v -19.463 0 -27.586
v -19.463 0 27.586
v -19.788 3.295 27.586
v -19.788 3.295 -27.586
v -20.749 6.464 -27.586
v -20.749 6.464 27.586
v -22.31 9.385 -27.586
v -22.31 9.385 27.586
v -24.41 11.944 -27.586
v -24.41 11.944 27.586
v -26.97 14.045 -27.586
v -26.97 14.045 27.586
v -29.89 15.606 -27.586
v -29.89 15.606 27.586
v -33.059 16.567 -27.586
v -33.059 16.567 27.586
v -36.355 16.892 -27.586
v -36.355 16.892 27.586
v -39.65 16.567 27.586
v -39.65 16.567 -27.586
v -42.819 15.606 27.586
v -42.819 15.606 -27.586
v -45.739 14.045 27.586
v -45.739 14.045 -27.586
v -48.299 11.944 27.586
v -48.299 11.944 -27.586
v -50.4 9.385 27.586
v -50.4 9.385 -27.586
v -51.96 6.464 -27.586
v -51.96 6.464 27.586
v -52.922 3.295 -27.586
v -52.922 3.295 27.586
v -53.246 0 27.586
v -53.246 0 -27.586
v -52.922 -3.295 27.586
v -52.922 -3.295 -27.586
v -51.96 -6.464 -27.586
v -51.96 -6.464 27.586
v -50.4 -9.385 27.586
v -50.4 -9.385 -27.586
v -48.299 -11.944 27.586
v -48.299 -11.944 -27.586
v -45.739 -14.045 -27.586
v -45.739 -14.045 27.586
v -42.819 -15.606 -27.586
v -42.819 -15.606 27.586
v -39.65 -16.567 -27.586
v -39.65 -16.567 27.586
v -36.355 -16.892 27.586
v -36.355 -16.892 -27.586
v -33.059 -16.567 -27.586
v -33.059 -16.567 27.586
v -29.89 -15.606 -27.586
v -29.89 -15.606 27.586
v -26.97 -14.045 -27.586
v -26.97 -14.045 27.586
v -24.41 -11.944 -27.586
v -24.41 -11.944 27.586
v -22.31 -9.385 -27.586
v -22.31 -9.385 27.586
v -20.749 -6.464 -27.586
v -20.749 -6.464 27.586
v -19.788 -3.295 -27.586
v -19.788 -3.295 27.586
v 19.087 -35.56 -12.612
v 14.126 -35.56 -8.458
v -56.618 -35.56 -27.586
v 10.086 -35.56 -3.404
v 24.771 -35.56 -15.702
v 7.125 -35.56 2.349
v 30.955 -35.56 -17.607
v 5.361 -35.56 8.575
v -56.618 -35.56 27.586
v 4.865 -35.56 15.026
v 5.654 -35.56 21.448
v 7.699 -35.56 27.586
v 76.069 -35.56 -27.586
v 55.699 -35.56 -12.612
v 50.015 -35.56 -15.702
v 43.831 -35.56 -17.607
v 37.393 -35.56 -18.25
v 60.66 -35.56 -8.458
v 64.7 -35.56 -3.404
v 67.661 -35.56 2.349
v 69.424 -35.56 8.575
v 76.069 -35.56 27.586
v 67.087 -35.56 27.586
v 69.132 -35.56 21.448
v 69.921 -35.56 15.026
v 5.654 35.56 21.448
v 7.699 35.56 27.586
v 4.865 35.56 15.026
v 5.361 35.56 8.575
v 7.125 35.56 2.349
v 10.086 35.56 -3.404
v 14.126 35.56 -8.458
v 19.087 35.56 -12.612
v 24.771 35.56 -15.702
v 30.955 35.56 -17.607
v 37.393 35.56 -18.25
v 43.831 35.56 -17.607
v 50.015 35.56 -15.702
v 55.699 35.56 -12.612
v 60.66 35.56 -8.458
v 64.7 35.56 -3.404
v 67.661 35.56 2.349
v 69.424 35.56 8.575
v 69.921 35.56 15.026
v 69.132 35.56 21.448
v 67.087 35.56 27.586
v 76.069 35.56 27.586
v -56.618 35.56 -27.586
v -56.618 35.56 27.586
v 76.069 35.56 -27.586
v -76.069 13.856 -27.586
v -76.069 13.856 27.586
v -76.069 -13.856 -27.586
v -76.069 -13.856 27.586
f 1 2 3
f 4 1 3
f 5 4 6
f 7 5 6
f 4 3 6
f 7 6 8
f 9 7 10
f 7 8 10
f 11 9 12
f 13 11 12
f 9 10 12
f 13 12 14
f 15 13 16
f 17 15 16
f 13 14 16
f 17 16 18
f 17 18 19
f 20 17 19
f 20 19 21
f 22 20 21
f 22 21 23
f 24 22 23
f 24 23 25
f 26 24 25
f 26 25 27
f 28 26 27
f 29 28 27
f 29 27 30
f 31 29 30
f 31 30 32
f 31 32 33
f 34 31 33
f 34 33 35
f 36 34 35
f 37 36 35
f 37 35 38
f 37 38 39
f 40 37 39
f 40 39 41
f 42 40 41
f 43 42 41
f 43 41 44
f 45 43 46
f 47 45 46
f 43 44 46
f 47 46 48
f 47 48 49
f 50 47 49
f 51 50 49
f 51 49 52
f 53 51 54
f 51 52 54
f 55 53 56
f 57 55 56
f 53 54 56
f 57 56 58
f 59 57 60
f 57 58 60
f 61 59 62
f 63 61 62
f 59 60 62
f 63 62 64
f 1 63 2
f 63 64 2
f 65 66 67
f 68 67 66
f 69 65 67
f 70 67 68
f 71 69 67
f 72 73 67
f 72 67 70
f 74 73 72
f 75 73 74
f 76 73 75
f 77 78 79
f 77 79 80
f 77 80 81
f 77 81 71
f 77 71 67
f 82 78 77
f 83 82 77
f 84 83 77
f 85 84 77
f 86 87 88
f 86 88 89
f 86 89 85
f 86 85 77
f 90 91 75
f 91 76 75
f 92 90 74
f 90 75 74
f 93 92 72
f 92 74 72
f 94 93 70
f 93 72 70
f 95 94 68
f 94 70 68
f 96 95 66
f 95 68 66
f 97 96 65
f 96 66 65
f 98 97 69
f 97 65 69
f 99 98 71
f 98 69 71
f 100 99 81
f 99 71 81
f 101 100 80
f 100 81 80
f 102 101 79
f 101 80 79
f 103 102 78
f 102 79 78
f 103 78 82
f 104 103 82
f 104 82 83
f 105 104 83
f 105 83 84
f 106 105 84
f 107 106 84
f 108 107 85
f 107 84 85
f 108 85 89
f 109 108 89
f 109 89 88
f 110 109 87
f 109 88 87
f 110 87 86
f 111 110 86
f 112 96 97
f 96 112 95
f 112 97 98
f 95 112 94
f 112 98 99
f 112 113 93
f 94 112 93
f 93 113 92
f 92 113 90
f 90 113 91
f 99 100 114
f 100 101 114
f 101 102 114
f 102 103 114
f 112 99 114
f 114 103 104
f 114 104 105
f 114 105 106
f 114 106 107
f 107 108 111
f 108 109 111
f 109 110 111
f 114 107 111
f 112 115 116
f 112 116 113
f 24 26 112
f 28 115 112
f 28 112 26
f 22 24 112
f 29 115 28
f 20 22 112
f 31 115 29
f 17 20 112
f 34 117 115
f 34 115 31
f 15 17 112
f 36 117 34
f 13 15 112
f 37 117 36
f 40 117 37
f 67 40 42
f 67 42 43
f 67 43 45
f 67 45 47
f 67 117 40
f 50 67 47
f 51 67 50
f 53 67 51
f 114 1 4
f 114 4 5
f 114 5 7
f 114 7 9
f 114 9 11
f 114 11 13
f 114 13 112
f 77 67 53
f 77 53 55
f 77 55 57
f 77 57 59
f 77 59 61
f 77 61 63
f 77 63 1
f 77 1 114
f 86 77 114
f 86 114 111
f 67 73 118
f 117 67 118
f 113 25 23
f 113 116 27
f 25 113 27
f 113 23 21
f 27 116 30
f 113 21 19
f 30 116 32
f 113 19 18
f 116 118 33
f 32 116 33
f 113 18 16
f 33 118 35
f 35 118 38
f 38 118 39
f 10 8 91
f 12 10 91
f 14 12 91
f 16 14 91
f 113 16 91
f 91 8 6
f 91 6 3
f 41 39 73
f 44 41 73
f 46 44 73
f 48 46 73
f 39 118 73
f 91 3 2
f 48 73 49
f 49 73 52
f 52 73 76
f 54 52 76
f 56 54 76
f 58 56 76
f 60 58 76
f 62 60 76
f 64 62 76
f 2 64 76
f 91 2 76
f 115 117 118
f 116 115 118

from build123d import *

# Parameters (mm, degrees)
F0_W          = 152.138144
F0_H          = 55.172988
F1_DEPTH      = 35.56
F1_DEPTH_BACK = 35.56
F2_R          = 32.536821
F3_DEPTH      = 74.65833
F4_R          = 16.891658
F5_DEPTH      = 60.75289
F7_DEPTH      = 58.39537


with BuildPart() as f1:
    # F0 (on Front) → F1 (new body, two sides)
    with BuildSketch(Plane.XZ) as f1_sk:
        Rectangle(F0_W, F0_H)
    extrude(amount=F1_DEPTH)
    extrude(f1_sk.sketch, amount=-F1_DEPTH_BACK)

    # F2 (on face) → F3 (cut)
    with BuildSketch(Plane.XZ.offset(35.56)):
        with Locations((37.392992, 14.286671)):
            Circle(F2_R)
    extrude(amount=-F3_DEPTH, mode=Mode.SUBTRACT)

    # F4 (on face) → F5 (cut)
    with BuildSketch(Plane.XY.offset(27.586494)):
        with Locations((-36.354639, 0)):
            Circle(F4_R)
    extrude(amount=-F5_DEPTH, mode=Mode.SUBTRACT)

    # F6 (on face) → F7 (cut)
    with BuildSketch(Plane.XY.offset(27.586494)):
        Polygon((-76.069072, -13.85648), (-76.069072, -35.56), (-56.617878, -35.56), align=None)
        Polygon((-76.069072, 13.85648), (-56.617878, 35.56), (-76.069072, 35.56), align=None)
    extrude(amount=-F7_DEPTH, mode=Mode.SUBTRACT)


solid = f1.part
